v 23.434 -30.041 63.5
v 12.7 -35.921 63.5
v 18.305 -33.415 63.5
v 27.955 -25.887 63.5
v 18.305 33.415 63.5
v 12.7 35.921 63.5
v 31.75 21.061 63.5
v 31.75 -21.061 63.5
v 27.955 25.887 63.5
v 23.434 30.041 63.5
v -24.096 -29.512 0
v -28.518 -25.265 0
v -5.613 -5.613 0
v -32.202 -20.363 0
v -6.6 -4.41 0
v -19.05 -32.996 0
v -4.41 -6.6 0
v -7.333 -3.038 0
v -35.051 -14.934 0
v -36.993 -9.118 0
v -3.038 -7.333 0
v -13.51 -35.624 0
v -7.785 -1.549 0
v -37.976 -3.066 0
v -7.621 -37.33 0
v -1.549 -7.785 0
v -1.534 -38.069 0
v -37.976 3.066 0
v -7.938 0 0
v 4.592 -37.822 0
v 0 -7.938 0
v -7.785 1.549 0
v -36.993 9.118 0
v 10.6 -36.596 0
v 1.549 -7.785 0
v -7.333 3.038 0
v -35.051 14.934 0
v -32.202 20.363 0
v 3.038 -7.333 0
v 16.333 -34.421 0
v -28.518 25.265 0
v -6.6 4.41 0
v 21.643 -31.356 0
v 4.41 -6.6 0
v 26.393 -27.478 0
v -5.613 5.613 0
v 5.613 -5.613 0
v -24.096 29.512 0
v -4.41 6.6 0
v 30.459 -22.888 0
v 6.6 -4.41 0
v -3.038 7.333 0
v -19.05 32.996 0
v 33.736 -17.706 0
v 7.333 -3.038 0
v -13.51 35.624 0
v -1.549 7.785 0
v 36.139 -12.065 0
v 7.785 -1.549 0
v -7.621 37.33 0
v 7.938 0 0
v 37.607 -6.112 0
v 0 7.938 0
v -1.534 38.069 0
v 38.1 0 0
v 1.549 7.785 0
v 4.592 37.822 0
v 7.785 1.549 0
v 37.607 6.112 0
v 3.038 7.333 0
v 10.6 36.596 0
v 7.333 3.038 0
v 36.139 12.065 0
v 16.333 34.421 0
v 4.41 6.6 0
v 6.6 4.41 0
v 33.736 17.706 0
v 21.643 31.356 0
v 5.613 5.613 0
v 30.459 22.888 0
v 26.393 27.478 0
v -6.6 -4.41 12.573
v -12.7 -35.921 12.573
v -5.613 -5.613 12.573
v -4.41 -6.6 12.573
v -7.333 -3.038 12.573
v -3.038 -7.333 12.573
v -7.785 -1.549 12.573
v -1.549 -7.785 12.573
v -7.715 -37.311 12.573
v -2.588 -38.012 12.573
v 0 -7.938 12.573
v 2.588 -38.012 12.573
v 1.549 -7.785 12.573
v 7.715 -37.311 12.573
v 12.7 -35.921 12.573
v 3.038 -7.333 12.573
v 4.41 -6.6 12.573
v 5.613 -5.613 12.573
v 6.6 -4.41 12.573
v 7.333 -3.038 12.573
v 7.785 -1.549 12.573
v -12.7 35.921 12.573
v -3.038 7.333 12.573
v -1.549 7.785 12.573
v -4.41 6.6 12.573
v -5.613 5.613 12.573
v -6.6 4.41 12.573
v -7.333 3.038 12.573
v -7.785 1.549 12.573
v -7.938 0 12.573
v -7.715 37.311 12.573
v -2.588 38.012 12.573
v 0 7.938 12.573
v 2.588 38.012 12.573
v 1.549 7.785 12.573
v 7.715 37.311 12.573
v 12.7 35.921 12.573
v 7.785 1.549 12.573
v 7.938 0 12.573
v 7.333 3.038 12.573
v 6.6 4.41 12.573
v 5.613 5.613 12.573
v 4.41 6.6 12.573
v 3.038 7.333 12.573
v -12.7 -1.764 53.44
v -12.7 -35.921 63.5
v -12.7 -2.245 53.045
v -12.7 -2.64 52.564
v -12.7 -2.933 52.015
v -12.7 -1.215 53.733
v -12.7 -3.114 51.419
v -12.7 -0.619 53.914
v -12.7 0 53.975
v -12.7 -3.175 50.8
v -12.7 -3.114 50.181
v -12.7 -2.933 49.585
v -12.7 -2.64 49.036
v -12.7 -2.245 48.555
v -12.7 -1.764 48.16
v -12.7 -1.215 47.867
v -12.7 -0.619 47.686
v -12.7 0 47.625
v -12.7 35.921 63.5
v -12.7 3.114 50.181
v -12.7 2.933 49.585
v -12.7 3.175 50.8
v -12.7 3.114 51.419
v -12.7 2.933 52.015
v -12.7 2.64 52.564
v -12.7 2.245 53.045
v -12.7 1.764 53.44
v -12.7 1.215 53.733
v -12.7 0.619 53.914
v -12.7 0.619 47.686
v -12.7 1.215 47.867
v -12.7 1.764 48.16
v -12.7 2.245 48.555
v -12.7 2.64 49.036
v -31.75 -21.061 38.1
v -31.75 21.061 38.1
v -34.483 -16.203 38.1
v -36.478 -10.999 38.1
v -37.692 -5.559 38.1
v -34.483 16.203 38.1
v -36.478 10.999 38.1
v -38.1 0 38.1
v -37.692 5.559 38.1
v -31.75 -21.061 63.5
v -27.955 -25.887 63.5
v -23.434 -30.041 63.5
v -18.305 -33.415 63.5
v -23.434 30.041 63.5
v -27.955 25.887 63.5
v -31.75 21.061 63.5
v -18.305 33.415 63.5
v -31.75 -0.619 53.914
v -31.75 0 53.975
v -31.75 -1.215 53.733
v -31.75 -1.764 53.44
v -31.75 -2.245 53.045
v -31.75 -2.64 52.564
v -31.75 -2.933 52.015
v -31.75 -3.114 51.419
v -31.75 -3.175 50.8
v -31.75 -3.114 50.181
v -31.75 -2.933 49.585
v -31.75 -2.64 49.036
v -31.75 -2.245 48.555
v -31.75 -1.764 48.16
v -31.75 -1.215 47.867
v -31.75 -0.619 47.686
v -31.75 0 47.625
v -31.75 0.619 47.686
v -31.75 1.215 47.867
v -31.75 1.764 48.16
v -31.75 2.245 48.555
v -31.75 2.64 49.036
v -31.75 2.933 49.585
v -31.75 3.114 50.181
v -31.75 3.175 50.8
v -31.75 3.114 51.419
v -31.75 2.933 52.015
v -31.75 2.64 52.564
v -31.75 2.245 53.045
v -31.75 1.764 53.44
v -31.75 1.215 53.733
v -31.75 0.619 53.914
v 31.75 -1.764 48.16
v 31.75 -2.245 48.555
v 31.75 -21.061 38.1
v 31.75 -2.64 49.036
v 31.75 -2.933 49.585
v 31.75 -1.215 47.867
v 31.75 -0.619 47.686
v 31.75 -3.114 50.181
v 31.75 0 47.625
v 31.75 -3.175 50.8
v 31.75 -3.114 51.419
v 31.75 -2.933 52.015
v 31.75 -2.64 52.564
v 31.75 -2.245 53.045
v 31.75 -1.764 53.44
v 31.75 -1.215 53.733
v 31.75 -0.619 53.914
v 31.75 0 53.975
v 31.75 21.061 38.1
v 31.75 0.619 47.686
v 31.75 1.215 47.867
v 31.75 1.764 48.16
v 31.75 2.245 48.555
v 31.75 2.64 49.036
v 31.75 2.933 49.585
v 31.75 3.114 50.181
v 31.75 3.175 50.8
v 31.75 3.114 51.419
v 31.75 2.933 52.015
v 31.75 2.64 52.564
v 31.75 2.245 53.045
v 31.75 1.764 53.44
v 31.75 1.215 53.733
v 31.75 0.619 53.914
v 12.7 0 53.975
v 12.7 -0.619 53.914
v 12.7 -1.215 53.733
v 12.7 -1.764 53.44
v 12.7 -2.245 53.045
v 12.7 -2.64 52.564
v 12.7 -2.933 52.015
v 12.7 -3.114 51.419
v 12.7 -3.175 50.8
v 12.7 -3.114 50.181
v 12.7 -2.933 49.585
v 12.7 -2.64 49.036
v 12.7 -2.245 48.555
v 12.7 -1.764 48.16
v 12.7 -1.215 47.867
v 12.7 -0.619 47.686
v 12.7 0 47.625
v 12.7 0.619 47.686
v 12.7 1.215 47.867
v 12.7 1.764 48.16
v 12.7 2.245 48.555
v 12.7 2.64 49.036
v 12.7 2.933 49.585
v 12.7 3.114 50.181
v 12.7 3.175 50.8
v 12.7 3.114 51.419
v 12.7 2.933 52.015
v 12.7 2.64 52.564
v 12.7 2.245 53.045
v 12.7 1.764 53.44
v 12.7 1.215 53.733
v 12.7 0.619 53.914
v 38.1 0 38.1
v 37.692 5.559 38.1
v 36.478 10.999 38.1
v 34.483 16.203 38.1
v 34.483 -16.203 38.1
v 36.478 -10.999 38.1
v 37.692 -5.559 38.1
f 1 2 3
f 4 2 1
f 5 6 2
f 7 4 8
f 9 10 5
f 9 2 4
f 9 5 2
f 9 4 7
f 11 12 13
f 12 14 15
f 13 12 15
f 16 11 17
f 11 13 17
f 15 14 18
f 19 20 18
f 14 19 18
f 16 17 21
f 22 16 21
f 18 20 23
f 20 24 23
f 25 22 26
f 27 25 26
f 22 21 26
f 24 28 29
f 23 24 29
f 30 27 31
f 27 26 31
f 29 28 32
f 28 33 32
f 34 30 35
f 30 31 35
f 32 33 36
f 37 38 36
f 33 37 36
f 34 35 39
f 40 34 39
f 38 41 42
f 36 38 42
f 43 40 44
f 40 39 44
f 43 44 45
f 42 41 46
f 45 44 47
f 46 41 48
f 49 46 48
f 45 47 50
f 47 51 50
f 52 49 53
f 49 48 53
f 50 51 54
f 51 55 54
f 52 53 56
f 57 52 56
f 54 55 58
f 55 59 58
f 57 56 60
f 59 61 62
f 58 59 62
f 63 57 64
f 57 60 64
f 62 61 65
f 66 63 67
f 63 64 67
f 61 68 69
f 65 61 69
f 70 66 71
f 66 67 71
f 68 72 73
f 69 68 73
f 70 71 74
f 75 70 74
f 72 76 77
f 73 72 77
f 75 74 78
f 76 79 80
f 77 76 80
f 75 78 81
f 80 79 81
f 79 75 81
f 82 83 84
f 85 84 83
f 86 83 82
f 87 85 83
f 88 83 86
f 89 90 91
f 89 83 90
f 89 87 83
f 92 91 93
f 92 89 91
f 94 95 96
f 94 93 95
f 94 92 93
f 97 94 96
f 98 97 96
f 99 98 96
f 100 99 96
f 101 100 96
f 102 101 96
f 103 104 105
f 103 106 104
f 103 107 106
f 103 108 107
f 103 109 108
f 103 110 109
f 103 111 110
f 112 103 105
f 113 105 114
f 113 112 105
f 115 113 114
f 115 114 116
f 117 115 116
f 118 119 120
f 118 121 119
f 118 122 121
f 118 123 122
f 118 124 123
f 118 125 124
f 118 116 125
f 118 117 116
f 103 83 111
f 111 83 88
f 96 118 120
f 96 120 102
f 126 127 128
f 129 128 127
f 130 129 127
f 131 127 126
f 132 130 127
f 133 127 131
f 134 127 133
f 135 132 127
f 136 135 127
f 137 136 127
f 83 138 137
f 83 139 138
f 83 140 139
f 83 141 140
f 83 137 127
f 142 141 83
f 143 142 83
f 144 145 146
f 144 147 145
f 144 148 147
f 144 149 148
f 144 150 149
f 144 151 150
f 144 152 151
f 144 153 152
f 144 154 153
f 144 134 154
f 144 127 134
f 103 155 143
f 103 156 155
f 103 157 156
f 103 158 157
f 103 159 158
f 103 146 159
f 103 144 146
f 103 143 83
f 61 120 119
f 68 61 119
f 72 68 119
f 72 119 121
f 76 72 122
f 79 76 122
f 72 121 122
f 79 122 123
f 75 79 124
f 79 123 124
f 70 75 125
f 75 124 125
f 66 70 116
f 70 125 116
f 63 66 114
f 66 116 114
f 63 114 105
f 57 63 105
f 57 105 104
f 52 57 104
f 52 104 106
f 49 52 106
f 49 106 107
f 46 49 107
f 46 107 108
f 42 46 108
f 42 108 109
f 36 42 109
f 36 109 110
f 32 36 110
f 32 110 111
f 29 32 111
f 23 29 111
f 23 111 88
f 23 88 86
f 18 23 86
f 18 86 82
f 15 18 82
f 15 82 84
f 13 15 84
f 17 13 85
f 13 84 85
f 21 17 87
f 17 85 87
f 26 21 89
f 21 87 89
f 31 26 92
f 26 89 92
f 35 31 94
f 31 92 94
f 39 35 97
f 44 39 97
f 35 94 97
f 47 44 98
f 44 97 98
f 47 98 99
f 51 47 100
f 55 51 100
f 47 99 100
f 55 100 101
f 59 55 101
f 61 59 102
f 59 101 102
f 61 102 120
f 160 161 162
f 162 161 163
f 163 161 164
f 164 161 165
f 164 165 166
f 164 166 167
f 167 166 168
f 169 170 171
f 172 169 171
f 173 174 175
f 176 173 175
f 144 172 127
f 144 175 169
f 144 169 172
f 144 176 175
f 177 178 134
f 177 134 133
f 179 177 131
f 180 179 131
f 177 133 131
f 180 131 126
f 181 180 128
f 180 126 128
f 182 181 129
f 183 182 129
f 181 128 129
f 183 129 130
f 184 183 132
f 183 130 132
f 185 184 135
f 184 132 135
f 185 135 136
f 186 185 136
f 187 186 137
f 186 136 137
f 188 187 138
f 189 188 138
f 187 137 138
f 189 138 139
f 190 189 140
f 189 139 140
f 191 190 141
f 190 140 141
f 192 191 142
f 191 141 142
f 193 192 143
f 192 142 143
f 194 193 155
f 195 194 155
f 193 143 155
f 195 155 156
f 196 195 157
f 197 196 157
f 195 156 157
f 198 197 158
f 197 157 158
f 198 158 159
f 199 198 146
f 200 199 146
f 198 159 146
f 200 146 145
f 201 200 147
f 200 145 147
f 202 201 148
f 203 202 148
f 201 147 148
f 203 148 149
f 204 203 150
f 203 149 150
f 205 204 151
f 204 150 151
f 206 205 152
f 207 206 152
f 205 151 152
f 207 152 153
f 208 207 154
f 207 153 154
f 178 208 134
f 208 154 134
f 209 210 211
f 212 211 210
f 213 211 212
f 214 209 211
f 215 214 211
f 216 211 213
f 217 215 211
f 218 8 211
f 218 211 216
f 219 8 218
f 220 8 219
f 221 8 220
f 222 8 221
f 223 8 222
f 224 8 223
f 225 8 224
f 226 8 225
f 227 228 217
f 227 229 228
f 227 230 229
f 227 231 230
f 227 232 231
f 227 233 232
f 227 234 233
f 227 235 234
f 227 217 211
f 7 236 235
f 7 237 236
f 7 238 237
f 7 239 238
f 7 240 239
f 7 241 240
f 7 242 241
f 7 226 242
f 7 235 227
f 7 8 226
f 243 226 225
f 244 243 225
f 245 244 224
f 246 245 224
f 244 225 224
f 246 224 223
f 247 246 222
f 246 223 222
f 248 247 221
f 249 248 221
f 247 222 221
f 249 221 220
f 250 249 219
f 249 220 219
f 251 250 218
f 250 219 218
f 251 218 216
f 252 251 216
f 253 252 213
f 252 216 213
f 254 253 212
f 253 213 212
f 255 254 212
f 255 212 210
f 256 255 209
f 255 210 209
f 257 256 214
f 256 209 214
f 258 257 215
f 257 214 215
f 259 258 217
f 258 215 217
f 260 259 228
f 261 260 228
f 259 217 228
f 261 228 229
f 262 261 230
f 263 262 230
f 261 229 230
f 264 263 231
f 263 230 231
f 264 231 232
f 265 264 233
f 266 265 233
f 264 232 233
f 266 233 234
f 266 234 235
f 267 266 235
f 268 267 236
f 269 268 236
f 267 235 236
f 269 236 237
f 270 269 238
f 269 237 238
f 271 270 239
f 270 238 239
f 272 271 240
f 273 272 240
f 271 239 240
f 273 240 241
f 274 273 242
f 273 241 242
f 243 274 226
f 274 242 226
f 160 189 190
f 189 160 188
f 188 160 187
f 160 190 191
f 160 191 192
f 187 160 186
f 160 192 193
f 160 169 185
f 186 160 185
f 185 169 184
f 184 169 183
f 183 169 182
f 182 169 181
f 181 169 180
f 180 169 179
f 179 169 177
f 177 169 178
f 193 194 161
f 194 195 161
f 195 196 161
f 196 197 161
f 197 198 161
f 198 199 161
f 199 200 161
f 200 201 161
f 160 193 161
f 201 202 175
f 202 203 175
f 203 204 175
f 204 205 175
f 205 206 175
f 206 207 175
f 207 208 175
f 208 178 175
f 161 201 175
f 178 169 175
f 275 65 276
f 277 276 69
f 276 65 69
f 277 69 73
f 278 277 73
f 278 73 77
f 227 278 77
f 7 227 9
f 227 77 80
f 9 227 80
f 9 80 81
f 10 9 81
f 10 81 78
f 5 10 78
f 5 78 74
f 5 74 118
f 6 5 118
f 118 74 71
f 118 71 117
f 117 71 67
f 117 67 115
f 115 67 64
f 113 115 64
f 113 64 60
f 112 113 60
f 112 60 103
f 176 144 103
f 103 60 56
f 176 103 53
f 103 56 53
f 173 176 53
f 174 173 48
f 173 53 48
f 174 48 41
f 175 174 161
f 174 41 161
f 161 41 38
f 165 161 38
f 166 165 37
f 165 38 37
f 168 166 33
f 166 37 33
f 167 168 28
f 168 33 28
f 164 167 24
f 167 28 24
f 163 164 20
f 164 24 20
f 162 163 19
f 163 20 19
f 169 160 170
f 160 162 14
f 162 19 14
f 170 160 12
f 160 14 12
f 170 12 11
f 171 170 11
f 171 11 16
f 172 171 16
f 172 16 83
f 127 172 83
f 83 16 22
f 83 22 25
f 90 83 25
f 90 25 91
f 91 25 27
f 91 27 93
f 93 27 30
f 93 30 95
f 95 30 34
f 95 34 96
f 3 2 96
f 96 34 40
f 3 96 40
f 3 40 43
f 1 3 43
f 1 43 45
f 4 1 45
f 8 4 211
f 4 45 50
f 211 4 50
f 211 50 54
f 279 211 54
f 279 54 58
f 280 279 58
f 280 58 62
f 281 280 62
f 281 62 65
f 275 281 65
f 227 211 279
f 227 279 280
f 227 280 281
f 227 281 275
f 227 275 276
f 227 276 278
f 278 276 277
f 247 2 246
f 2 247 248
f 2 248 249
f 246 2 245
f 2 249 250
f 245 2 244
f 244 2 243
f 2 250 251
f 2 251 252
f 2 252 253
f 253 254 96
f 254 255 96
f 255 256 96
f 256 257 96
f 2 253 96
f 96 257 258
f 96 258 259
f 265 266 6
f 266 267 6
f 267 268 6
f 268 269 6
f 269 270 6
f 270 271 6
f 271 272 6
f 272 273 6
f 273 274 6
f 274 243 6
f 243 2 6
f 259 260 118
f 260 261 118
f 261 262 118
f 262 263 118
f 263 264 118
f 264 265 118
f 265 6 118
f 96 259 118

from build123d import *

# Parameters (mm, degrees)
SKETCH1_R                                = 38.1
OD_DON_T_CARE_DEPTH                      = 63.5
SKETCH2_R                                = 3.175
F_2X_1_4_THROUGH_HOLE_DEPTH              = 50.8
SKETCH3_W                                = 25.4
SKETCH3_H                                = 50.927
SLOT_DEPTH                               = 50.8
SKETCH4_R                                = 7.9375
F_5_8_THROUGH_HOLE_DEPTH                 = 75.140268103
SKETCH5_OUTSIDE_W                        = 103.216
SKETCH5_OUTSIDE_H                        = 103.216
SKETCH5_OUTSIDE_W_2                      = 63.5
SKETCH5_OUTSIDE_H_2                      = 71.842048968
FLAT_SURFACE_FOR_3_4_LONG_SHOULDER_DEPTH = 25.4


with BuildPart() as part:
    # Sketch1 → OD Don't Care (new body)
    with BuildSketch(Plane.XY):
        Circle(SKETCH1_R)
    extrude(amount=OD_DON_T_CARE_DEPTH)

    # Sketch2 → 2x 1/4" Through Hole (cut, symmetric)
    with BuildSketch(Plane(origin=(0, 0, 0), x_dir=(0, 0, -1), z_dir=(1, 0, 0))):
        with Locations(Location((-50.8, 0, 0), (0, 0, 180))):
            Circle(SKETCH2_R)
    extrude(amount=F_2X_1_4_THROUGH_HOLE_DEPTH, both=True, mode=Mode.SUBTRACT)

    # Sketch3 → Slot (cut, symmetric)
    with BuildSketch(Plane(origin=(0, 0, 0), x_dir=(1, 0, 0), z_dir=(0, 1, 0))):
        with Locations((0, -38.0365)):
            Rectangle(SKETCH3_W, SKETCH3_H)
    extrude(amount=SLOT_DEPTH, both=True, mode=Mode.SUBTRACT)

    # Sketch4 → 5/8" Through Hole (cut, through all)
    with BuildSketch(Plane.XY.offset(12.573)):
        Circle(SKETCH4_R)
    extrude(amount=-F_5_8_THROUGH_HOLE_DEPTH, mode=Mode.SUBTRACT)

    # Sketch5 outside → Flat Surface for 3/4" Long Shoulder (cut)
    with BuildSketch(Plane.XY.offset(63.5)):
        Rectangle(SKETCH5_OUTSIDE_W, SKETCH5_OUTSIDE_H)
        Rectangle(SKETCH5_OUTSIDE_W_2, SKETCH5_OUTSIDE_H_2, mode=Mode.SUBTRACT)
    extrude(amount=-FLAT_SURFACE_FOR_3_4_LONG_SHOULDER_DEPTH, mode=Mode.SUBTRACT)


solid = part.part
